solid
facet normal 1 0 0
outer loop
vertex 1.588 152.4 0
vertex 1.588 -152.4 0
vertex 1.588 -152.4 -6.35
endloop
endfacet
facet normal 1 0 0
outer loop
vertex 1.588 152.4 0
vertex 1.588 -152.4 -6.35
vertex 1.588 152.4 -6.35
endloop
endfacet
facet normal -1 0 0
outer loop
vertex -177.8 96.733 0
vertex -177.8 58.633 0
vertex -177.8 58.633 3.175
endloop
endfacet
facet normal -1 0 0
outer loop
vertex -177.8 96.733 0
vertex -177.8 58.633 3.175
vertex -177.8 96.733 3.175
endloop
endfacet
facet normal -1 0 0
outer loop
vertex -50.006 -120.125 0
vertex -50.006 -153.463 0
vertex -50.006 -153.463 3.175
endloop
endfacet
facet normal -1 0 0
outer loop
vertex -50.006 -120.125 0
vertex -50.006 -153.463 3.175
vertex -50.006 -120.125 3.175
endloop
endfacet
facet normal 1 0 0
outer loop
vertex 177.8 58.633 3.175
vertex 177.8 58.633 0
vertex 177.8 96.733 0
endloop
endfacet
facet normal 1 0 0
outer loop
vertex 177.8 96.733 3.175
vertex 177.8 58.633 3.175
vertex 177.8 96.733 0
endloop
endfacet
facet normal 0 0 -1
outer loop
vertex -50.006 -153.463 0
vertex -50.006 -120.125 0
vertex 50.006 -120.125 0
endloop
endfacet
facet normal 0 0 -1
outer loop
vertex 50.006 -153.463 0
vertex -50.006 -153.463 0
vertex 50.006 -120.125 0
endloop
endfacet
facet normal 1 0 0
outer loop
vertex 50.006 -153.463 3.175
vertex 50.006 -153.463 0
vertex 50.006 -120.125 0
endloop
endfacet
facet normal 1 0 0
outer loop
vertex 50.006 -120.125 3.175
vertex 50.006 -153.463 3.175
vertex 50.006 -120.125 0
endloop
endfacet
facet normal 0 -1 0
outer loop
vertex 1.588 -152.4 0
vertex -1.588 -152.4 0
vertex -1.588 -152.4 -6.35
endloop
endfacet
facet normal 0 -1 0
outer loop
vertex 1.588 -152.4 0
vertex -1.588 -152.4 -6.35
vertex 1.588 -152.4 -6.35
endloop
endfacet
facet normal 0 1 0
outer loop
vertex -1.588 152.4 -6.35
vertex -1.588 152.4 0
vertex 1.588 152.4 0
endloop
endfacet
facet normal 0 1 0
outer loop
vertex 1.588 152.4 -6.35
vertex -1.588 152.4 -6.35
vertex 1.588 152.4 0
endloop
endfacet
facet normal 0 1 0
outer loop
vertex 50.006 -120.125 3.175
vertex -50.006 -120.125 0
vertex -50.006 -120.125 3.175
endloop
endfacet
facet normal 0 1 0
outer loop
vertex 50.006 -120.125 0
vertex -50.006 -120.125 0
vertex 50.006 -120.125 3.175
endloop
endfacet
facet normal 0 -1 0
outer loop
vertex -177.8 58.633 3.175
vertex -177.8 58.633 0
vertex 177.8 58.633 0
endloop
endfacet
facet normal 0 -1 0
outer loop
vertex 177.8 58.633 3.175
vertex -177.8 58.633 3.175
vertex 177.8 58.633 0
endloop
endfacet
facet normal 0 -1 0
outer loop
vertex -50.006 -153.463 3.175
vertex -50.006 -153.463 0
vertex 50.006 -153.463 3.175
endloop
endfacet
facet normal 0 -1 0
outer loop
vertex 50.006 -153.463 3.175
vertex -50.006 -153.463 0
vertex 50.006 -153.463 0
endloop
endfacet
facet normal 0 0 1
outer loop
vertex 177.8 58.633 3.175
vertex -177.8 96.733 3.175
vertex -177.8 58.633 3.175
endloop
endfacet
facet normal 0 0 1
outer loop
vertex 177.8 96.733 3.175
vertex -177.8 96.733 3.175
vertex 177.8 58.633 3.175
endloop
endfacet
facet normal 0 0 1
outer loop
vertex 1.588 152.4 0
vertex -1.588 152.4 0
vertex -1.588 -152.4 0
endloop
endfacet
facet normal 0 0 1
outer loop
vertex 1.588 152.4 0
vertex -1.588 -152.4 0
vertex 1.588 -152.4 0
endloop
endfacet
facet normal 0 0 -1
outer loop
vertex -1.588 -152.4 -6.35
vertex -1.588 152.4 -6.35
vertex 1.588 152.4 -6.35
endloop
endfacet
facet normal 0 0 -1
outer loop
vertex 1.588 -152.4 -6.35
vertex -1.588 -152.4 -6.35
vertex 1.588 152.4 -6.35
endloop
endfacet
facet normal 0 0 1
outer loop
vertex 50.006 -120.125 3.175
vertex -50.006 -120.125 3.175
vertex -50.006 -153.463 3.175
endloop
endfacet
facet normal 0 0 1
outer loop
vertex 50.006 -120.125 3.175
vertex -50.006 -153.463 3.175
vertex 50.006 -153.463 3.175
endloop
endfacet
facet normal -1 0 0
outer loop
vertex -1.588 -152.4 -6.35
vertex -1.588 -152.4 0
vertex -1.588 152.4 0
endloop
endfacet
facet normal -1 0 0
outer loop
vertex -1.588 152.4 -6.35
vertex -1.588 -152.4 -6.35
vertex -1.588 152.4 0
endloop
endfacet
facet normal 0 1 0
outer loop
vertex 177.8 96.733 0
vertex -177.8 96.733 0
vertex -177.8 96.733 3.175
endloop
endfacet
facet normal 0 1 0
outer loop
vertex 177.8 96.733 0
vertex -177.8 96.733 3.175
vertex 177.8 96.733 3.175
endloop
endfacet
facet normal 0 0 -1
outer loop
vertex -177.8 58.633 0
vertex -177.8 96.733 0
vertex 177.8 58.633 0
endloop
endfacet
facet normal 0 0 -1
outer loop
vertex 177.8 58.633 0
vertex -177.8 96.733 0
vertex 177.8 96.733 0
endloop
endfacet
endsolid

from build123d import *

# Parameters (mm, degrees)
F1_W     = 355.6
F1_H     = 38.1
F2_DEPTH = 3.175
F1_W_2   = 100.0125
F1_H_2   = 33.3375
F3_DEPTH = 3.175
F0_W     = 3.175
F0_H     = 304.8
F4_DEPTH = 6.35


with BuildPart() as f2:
    # F1 (on Top) → F2 (new body)
    with BuildSketch(Plane.XY):
        with Locations((0, 77.683354)):
            Rectangle(F1_W, F1_H)
    extrude(amount=F2_DEPTH)


with BuildPart() as f3:
    # F1 (on Top) → F3 (new body)
    with BuildSketch(Plane.XY):
        with Locations((0, -136.793778)):
            Rectangle(F1_W_2, F1_H_2)
    extrude(amount=F3_DEPTH)


with BuildPart() as f4:
    # F0 (on Top) → F4 (new body)
    with BuildSketch(Plane.XY):
        Rectangle(F0_W, F0_H)
    extrude(amount=-F4_DEPTH)


solid = Compound([f2.part, f3.part, f4.part])
